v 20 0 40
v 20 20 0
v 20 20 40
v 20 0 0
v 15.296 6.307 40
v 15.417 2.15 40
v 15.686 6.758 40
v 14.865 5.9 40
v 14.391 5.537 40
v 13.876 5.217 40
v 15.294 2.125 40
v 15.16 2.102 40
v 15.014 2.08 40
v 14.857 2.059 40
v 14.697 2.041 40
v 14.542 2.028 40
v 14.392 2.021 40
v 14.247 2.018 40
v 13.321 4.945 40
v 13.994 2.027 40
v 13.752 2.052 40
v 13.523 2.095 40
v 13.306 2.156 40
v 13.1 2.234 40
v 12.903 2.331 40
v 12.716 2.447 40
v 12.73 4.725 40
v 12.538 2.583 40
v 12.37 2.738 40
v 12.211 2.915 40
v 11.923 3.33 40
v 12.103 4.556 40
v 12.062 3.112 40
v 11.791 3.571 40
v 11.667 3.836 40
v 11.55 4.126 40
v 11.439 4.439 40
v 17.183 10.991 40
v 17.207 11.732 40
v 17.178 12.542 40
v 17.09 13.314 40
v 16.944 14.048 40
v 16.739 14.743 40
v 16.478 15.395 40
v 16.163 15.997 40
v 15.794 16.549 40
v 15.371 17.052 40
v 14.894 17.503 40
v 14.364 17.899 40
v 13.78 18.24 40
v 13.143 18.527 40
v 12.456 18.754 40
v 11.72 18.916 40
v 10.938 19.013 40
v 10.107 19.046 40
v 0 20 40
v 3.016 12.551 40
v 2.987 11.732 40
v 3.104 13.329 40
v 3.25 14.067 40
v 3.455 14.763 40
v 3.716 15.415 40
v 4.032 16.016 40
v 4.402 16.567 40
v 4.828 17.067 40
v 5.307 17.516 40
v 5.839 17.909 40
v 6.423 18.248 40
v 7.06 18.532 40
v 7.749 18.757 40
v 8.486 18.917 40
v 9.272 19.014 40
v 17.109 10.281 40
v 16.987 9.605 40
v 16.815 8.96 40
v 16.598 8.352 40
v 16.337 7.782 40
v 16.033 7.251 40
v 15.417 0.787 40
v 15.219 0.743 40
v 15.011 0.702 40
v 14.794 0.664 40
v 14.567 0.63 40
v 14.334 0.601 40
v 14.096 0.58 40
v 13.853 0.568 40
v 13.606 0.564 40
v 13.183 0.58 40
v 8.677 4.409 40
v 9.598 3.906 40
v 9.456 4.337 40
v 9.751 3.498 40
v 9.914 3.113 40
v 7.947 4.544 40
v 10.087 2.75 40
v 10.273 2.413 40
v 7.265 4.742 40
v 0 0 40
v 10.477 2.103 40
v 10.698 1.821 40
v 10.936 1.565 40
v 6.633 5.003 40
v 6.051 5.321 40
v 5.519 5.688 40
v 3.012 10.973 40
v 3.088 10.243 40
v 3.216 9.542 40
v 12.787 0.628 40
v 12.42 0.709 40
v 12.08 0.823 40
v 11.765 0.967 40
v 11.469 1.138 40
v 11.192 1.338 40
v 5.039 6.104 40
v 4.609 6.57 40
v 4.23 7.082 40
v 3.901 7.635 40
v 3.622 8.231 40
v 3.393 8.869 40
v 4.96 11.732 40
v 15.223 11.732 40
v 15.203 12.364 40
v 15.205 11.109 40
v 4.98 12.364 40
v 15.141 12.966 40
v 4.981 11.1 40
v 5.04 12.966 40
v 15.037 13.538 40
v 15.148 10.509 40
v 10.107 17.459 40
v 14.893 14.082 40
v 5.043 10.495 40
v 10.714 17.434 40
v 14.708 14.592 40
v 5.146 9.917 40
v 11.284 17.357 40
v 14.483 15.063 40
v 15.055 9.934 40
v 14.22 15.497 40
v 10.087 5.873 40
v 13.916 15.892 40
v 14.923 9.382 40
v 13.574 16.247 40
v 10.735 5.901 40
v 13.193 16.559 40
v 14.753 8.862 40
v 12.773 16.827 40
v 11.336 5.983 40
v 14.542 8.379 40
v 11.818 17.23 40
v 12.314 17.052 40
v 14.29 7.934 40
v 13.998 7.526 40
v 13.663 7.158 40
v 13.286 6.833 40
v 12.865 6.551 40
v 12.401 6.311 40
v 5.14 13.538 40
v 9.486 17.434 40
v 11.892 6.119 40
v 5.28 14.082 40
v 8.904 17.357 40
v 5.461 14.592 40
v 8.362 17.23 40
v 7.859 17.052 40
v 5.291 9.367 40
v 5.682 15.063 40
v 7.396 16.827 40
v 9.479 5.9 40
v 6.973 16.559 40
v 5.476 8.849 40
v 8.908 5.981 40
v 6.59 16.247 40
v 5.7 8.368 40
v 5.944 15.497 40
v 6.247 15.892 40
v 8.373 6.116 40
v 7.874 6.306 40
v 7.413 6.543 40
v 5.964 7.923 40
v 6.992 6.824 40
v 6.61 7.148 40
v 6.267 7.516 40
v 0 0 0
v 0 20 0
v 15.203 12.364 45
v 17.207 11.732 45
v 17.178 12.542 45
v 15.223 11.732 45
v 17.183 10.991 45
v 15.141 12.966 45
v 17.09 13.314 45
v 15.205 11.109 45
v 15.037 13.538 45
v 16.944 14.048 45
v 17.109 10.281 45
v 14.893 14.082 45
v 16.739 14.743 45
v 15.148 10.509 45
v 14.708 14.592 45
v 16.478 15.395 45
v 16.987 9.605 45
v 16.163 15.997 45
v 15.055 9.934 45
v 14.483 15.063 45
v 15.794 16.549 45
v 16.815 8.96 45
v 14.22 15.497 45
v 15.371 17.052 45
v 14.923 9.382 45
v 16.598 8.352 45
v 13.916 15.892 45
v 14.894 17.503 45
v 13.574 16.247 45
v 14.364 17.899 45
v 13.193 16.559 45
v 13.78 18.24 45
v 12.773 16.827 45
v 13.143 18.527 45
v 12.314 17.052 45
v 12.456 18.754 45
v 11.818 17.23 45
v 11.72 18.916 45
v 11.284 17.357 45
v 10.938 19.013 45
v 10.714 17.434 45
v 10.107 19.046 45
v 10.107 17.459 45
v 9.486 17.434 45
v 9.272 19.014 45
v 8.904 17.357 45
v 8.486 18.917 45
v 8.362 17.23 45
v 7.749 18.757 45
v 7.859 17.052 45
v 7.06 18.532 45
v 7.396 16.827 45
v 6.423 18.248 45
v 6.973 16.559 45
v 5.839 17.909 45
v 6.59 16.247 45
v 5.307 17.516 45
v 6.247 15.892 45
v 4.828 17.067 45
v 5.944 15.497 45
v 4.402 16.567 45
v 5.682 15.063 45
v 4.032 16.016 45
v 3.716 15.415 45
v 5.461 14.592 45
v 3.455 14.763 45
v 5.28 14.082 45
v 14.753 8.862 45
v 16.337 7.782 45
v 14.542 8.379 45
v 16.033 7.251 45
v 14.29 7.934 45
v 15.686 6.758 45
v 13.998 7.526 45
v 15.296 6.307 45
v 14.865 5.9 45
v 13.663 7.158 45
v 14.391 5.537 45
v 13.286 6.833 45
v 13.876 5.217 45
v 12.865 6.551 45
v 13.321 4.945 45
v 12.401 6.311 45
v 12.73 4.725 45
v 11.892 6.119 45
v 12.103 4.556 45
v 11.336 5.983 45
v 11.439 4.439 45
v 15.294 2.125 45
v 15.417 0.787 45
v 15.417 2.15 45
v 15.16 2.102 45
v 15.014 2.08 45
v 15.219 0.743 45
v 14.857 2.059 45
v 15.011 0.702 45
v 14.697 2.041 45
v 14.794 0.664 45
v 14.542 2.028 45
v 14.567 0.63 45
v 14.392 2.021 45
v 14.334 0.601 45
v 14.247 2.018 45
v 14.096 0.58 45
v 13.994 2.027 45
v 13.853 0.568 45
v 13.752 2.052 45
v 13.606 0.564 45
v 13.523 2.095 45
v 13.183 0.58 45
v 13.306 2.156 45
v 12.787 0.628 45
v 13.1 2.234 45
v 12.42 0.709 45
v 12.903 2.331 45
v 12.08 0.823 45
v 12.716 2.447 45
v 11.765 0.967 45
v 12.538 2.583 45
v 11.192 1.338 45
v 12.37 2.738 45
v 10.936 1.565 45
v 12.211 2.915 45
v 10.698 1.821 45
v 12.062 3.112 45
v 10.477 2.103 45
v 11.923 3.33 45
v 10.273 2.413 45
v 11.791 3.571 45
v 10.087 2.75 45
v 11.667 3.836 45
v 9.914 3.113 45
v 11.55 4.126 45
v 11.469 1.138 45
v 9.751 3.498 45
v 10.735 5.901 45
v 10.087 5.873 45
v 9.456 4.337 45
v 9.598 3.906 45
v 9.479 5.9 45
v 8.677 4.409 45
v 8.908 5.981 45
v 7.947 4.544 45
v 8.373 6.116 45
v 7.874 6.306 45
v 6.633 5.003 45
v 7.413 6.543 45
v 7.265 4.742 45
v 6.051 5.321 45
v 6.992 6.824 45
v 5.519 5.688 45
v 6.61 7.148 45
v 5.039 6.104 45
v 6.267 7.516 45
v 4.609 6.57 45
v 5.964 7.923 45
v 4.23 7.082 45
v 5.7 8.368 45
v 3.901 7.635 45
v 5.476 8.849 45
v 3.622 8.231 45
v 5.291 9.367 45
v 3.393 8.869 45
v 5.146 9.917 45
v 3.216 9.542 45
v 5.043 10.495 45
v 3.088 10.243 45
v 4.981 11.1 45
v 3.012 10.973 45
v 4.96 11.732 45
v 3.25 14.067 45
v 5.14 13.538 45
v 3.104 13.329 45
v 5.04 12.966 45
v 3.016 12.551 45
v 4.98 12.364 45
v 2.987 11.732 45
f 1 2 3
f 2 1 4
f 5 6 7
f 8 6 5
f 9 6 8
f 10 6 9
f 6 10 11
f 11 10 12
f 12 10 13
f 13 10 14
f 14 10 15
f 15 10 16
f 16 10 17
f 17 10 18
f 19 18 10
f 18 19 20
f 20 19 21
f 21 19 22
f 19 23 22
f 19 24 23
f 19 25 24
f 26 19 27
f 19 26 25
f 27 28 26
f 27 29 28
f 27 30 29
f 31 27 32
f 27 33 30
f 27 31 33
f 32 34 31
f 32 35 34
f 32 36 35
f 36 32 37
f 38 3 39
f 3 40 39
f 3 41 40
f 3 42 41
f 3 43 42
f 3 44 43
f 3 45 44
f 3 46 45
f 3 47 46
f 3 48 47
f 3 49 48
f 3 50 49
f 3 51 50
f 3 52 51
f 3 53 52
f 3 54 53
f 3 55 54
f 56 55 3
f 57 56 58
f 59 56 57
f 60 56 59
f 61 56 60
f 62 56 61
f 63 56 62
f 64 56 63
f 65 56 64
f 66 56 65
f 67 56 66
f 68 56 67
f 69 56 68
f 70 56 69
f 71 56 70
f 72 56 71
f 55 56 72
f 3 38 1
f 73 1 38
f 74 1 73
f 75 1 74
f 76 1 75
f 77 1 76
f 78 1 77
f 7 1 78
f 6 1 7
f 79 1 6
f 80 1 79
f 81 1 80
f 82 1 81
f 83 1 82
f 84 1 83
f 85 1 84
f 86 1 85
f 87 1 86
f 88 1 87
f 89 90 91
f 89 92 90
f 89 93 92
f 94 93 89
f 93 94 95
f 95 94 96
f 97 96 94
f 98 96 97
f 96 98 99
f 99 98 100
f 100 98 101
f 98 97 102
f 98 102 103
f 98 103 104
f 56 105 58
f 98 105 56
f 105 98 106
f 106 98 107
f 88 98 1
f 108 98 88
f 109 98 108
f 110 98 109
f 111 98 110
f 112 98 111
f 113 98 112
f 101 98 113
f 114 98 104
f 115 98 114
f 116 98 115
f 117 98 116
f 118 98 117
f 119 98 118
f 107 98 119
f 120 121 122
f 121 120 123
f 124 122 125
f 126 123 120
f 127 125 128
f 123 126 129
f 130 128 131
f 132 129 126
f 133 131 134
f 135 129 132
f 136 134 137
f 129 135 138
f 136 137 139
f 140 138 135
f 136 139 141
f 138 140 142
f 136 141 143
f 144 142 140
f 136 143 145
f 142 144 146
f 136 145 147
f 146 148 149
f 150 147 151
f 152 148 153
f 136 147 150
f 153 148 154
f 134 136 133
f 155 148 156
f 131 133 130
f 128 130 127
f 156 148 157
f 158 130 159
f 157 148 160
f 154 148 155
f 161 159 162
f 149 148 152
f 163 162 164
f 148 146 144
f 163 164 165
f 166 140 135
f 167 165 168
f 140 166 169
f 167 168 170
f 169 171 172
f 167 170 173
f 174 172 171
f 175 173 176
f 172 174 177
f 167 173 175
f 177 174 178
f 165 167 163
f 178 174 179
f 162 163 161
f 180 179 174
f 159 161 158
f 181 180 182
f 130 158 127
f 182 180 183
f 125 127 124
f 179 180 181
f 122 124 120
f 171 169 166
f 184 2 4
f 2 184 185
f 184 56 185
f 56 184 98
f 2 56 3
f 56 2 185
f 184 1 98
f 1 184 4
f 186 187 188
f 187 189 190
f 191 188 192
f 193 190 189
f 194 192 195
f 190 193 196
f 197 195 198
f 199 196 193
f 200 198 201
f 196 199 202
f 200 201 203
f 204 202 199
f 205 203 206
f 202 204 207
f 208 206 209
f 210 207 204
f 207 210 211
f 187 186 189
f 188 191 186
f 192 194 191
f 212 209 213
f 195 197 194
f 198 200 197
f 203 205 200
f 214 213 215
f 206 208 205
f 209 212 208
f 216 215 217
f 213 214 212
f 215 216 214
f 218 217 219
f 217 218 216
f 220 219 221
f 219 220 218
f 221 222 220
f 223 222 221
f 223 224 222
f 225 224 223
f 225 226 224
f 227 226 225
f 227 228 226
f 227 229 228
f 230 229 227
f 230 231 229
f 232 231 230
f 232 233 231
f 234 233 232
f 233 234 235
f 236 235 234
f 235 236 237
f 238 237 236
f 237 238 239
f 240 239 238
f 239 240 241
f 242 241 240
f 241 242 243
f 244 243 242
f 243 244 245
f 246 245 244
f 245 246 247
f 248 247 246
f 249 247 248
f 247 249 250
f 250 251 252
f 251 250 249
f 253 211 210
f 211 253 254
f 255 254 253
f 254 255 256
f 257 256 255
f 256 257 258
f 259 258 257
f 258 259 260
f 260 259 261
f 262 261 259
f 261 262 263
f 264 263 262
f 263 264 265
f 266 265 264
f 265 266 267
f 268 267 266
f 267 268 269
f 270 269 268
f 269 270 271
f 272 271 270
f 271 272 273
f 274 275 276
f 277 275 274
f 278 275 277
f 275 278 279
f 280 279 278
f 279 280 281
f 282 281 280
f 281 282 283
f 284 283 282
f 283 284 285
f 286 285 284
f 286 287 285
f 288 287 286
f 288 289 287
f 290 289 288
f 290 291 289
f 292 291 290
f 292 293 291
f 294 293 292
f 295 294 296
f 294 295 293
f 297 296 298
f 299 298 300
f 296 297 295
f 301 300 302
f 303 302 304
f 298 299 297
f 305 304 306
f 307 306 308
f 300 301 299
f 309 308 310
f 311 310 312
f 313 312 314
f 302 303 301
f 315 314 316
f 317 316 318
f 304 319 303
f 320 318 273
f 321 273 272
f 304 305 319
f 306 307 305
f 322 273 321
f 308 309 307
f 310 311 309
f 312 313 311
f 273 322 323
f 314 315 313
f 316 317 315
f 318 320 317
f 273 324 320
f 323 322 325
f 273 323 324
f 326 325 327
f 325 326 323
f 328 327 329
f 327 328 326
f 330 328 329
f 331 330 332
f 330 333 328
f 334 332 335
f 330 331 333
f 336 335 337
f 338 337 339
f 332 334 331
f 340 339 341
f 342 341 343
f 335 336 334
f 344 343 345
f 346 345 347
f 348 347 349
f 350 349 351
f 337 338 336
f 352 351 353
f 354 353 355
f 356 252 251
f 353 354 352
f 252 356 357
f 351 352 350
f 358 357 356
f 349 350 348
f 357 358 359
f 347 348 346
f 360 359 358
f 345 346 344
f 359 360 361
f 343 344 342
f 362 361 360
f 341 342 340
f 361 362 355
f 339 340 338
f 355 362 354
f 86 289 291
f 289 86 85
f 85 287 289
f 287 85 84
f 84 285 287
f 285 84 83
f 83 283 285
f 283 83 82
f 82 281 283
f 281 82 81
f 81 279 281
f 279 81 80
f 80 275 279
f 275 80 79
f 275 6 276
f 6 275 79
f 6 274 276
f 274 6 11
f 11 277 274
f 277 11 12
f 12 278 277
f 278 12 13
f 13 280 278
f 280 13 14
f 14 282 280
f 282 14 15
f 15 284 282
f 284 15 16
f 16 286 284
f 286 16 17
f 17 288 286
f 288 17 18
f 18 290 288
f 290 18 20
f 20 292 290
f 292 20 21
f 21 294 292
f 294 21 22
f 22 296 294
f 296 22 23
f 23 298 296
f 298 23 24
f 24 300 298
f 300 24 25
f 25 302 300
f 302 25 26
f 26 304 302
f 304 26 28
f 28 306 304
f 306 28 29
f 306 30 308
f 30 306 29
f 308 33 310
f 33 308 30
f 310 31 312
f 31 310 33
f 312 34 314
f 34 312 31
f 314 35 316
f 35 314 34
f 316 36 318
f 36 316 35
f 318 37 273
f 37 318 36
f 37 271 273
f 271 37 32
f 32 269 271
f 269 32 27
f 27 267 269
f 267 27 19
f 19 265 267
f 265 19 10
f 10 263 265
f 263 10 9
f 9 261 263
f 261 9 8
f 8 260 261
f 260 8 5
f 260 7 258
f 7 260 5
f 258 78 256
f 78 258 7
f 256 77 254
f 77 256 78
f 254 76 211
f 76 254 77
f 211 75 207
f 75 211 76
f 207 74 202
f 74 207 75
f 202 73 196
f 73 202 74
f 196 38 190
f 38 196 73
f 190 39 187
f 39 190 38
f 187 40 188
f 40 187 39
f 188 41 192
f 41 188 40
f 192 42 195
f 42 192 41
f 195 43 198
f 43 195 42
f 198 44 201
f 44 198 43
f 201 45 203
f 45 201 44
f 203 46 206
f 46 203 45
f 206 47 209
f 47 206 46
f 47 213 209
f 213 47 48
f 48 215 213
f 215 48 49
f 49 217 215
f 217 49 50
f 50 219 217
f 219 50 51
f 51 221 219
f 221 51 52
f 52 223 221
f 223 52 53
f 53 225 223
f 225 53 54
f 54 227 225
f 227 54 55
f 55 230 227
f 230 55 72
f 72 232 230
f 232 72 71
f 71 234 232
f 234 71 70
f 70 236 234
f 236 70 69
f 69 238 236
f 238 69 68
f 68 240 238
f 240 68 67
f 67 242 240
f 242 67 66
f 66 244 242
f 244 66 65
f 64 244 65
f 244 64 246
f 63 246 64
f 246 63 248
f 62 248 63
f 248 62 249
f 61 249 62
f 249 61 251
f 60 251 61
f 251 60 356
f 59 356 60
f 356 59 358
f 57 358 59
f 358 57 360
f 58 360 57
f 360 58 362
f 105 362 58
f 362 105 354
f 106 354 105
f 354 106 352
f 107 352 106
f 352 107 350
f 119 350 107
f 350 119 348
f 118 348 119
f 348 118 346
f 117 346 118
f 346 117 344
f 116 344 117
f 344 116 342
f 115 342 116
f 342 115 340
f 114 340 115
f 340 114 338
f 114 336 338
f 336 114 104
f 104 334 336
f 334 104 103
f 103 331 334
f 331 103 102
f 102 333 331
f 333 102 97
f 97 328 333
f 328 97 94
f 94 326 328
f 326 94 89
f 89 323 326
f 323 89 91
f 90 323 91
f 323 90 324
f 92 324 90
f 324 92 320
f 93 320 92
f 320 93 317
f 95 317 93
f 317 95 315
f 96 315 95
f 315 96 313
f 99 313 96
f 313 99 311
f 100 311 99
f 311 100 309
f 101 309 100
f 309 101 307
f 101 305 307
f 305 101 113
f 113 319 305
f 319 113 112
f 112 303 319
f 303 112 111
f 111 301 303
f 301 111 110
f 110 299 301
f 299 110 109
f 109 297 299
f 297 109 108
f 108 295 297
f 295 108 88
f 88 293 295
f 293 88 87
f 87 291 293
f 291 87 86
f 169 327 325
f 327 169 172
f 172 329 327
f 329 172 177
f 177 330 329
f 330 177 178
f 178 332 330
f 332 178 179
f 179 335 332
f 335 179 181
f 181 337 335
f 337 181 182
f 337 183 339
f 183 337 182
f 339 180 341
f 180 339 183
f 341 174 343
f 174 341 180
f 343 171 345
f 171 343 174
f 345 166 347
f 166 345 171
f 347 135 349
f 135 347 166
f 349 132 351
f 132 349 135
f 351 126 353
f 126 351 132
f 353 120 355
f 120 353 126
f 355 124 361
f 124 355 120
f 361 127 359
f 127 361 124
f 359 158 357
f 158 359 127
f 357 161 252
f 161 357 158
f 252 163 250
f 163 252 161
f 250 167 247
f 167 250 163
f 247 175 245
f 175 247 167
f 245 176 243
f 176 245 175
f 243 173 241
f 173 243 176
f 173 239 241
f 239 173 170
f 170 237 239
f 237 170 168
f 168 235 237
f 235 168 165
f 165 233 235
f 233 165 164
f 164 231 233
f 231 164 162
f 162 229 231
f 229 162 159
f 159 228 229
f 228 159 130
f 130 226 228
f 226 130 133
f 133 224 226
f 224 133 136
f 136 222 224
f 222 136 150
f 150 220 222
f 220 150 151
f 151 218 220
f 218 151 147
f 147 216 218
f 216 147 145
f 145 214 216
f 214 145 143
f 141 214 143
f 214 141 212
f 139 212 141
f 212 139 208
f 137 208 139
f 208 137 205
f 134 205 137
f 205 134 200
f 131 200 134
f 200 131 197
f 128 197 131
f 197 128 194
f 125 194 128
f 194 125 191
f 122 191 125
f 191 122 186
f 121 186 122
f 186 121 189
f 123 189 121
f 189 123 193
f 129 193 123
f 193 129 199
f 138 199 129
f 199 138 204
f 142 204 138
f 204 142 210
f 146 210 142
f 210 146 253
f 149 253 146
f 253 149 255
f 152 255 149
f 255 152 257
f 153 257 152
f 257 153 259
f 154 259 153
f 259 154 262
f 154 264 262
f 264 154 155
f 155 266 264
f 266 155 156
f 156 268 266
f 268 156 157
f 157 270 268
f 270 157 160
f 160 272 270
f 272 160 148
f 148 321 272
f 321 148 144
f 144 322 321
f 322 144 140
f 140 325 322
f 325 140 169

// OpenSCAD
cube([20, 20, 40]);
translate([2, 4.5, 40]){
    linear_extrude(5){
        text("Q", size=15);
    }
}
